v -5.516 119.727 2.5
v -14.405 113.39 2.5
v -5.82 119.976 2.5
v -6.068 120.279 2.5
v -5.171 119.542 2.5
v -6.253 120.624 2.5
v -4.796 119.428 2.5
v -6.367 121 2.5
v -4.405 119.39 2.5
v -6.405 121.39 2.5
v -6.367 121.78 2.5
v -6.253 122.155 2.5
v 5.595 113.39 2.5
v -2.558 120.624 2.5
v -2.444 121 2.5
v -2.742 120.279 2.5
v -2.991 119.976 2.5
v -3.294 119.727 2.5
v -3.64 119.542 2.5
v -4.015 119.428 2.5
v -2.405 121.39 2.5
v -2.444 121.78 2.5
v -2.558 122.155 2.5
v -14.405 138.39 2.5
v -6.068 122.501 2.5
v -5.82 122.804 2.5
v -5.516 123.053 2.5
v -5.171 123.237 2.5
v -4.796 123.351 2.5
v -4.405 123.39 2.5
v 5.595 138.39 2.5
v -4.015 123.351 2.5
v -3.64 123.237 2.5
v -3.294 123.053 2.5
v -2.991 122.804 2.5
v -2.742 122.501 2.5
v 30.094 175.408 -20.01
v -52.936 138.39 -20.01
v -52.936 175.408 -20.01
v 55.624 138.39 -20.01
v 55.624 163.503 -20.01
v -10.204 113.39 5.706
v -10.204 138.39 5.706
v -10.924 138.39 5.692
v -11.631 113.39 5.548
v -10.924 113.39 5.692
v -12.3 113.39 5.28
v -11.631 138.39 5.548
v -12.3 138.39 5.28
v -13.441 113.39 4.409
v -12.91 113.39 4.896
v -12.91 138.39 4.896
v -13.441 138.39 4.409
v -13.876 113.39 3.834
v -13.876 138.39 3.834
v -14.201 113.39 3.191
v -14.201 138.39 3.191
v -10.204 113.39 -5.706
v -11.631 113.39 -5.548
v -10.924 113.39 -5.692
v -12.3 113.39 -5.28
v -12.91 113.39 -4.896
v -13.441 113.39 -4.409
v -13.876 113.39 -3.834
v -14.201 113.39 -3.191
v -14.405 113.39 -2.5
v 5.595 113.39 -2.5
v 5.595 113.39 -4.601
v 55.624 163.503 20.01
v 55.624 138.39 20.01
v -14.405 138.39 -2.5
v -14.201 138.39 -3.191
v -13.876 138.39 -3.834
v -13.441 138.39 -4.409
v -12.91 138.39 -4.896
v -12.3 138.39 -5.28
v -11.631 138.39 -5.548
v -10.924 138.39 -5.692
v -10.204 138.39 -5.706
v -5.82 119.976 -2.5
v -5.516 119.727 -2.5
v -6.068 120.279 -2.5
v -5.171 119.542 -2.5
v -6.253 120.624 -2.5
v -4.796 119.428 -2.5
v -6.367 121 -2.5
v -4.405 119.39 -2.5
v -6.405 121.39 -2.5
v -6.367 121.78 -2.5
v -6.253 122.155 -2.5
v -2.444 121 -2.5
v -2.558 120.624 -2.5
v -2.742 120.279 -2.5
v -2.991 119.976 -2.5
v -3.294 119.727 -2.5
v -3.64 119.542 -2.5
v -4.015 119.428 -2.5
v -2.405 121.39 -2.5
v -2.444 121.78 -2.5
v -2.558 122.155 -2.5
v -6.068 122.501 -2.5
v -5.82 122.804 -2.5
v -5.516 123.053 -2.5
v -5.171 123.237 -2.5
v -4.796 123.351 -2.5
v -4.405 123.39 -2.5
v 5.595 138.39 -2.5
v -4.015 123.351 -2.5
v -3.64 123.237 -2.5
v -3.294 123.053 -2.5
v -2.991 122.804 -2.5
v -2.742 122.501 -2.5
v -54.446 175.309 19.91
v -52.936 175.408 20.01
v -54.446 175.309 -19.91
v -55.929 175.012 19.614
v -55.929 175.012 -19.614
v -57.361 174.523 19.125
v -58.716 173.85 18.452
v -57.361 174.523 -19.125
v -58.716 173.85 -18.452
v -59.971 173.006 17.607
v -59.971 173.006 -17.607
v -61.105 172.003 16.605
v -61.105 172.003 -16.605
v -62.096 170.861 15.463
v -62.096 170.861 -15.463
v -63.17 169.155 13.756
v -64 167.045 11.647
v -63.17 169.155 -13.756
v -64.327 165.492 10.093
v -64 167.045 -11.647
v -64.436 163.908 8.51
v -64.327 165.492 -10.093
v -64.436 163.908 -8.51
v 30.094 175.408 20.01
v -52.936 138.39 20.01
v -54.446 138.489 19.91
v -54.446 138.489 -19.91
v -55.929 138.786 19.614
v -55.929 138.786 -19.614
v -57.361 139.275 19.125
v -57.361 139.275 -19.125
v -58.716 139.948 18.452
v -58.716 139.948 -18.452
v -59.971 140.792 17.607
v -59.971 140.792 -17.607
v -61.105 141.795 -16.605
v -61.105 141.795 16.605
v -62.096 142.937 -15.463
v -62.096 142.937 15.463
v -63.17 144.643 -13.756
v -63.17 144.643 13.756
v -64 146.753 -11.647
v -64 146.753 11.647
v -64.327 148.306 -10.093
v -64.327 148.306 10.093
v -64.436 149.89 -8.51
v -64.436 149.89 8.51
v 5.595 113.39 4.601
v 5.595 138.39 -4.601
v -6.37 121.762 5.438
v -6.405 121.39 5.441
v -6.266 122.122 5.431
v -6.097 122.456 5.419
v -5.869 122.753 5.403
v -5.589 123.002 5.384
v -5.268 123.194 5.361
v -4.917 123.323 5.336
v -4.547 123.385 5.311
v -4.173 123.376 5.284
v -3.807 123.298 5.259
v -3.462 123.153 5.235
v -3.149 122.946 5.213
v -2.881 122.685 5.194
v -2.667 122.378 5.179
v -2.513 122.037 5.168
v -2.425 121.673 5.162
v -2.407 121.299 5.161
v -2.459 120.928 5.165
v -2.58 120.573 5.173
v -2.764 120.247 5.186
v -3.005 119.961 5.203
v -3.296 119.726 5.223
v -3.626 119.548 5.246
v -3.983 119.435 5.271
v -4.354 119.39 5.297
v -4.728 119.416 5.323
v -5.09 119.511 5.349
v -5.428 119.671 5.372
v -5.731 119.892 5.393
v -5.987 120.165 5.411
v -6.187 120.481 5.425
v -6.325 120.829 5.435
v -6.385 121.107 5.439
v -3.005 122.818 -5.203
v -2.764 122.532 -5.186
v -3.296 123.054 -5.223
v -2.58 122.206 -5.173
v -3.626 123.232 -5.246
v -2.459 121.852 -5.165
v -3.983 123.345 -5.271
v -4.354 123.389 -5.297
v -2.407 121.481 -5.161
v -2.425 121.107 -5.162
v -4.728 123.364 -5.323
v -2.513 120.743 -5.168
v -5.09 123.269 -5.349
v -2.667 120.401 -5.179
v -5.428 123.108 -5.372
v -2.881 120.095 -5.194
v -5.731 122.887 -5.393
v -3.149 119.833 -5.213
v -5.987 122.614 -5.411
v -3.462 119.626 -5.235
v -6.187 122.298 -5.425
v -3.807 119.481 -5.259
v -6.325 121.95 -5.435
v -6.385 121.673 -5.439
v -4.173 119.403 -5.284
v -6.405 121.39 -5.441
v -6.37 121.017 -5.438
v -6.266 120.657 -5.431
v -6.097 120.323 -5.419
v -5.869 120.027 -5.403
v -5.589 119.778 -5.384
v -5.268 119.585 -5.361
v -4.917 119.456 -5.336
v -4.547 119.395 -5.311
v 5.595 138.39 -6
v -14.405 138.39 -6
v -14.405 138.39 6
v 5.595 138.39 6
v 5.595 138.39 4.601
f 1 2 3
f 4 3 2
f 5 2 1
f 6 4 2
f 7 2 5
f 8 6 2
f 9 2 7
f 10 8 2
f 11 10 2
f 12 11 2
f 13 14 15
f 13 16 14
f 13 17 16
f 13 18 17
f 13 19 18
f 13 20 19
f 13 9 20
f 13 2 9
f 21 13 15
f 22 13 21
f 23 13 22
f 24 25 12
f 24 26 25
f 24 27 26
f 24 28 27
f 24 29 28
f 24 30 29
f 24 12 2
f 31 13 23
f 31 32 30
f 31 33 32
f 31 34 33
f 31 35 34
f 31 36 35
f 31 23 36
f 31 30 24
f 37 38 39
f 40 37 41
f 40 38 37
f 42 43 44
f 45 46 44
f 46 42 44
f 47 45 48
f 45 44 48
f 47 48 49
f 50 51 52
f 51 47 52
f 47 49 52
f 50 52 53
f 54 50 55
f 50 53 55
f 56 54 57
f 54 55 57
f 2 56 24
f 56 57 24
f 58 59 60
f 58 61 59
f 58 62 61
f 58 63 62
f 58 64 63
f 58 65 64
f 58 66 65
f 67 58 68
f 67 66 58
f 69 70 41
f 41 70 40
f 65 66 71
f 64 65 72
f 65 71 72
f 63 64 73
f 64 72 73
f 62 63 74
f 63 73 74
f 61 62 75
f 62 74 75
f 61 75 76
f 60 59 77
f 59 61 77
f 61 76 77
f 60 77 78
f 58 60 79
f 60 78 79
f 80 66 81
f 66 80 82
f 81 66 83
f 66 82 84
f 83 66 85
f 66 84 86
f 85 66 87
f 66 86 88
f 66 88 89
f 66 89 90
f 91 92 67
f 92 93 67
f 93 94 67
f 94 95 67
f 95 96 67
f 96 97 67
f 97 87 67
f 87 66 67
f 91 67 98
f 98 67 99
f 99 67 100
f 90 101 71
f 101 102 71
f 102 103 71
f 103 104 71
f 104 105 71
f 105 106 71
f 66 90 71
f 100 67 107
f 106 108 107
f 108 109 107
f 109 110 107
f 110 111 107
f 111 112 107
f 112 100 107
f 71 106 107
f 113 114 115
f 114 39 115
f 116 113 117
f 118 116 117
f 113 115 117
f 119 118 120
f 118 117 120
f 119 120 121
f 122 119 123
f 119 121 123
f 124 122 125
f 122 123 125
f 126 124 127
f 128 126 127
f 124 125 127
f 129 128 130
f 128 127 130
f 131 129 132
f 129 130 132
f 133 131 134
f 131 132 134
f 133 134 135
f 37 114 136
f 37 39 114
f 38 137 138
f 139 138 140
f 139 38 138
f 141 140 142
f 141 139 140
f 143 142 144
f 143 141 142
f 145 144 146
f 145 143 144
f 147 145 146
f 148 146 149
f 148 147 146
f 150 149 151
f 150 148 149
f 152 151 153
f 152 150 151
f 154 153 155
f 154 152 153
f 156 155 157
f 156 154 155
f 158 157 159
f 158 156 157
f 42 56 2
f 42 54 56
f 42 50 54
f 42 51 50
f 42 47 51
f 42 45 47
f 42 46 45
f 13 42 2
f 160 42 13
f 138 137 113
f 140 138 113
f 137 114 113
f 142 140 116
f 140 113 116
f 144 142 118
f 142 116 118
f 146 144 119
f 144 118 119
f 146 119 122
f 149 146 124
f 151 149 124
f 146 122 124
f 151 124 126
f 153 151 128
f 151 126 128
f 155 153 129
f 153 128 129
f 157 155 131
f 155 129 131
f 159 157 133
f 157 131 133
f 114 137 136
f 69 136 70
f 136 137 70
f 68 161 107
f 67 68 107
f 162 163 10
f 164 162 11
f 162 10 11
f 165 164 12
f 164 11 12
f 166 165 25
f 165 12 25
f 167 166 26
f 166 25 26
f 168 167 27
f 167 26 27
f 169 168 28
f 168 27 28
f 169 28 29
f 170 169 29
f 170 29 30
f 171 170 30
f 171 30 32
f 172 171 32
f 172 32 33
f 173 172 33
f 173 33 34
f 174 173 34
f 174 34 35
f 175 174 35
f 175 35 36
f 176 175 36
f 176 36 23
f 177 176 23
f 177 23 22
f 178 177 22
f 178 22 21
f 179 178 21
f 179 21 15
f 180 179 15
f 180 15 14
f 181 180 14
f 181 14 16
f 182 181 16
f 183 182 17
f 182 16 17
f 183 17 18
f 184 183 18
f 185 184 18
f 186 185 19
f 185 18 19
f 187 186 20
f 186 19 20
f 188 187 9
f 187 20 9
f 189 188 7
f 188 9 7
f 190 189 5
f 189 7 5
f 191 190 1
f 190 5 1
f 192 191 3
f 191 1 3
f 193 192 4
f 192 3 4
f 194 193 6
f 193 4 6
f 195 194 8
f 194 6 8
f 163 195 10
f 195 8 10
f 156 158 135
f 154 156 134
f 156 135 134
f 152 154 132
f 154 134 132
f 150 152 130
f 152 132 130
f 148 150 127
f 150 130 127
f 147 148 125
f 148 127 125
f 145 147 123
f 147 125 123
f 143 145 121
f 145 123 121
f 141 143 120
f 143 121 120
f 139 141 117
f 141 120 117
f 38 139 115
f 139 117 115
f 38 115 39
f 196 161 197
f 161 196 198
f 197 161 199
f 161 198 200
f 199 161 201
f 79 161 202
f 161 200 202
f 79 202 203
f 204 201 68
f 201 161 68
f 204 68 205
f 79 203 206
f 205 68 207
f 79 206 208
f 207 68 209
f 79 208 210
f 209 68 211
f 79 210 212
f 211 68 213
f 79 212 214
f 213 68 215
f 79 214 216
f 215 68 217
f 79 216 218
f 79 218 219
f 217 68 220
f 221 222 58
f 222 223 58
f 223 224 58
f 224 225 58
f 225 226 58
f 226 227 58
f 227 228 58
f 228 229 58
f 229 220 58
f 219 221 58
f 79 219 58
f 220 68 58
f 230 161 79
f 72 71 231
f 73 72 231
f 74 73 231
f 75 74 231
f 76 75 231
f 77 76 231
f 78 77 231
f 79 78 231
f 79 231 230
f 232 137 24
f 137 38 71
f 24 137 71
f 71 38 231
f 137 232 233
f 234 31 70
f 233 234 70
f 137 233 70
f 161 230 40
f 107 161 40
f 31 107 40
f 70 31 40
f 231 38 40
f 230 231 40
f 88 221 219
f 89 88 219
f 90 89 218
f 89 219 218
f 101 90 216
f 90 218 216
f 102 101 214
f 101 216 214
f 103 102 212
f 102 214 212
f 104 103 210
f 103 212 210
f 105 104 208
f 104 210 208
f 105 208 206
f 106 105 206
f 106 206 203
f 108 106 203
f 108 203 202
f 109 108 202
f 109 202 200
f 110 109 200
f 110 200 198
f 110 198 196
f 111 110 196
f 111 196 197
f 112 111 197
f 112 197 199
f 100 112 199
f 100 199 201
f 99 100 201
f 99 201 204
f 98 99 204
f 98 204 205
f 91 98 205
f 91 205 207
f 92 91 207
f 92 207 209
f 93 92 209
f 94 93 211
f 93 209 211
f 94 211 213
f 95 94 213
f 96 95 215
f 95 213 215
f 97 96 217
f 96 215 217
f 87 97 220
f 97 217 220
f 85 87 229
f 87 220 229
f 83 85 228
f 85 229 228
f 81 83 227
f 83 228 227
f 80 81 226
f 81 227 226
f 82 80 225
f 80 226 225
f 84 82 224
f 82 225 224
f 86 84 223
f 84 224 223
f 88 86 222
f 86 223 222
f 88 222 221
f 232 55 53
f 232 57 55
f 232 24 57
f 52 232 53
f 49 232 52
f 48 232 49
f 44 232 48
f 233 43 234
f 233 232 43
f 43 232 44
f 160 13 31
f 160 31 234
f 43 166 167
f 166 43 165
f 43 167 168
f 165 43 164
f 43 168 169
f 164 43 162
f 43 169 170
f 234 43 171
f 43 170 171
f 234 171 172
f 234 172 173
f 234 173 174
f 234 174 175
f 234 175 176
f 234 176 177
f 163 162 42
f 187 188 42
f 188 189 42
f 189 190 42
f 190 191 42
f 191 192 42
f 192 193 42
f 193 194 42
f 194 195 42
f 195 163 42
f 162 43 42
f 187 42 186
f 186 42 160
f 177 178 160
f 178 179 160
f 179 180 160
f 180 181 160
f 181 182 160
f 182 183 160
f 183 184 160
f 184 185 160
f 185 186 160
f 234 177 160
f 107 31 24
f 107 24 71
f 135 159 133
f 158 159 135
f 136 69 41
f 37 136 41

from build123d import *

# Parameters (mm, degrees)
SKETCH1_W            = 1044
SKETCH1_H            = 348
BOSS_EXTRUDE1_DEPTH  = 321.9
CHAMFER2_SIZE        = 222
CHAMFER2_SIZE2       = 103.52030011
FILLET1_R            = 100
SCALE1_SCALE         = 0.115
SKETCH175_W          = 20
SKETCH175_H          = 12
BOSS_EXTRUDE12_DEPTH = 25
SKETCH176_W          = 5
SKETCH176_H          = 25
CUT_EXTRUDE1_DEPTH   = 30
SKETCH177_R          = 2
CUT_EXTRUDE2_DEPTH   = 30
CUT_EXTRUDE4_DEPTH   = 25
FILLET3_R            = 4


with BuildPart() as part:
    # Sketch1 → Boss-Extrude1 (new body)
    with BuildSketch(Plane(origin=(0, 0, 0), x_dir=(1, 0, 0), z_dir=(0, 1, 0))):
        Rectangle(SKETCH1_W, SKETCH1_H)
    extrude(amount=BOSS_EXTRUDE1_DEPTH)

    # Chamfer2
    chamfer2_edges = [part.edges().sort_by_distance(p)[0] for p in [
        (522, 321.9, 0),
    ]]
    chamfer2_side = [part.faces().sort_by_distance(p)[0] for p in [
        (0, 321.9, 0),
    ]]
    chamfer(chamfer2_edges, length=CHAMFER2_SIZE, length2=CHAMFER2_SIZE2, reference=chamfer2_side[0])

    # Fillet1
    fillet1_edges = [part.edges().sort_by_distance(p)[0] for p in [
        (-522, 321.9, 0),
        (-522, 0, 0),
        (-522, 160.95, -174),
        (-522, 160.95, 174),
    ]]
    fillet(fillet1_edges, radius=FILLET1_R)


with BuildPart() as part_1:
    # Scale1: scaled about (-4.978902211, 156.372589253, 0)
    add(part.part.scale(SCALE1_SCALE).moved(Location((-4.406328457, 138.389741489, 0))))


with BuildPart() as boss_extrude12_tool:
    # Sketch175 → Boss-Extrude12 (new body)
    with BuildSketch(Plane.XZ.offset(-138.389734505)):
        with Locations((-4.405349795, 0)):
            Rectangle(SKETCH175_W, SKETCH175_H)
    extrude(amount=BOSS_EXTRUDE12_DEPTH)


with BuildPart() as part_2:
    add(part_1.part)


with BuildPart() as part_3:
    # Boss-Extrude12: joined with boss_extrude12_tool
    add(part_2.part.fuse(boss_extrude12_tool.part, tol=0.00001))

    # Sketch176 → Cut-Extrude1 (cut)
    with BuildSketch(Plane(origin=(5.594650205, 0, 0), x_dir=(0, 0, -1), z_dir=(1, 0, 0))):
        with Locations((0, 125.889734505)):
            Rectangle(SKETCH176_W, SKETCH176_H)
    extrude(amount=-CUT_EXTRUDE1_DEPTH, mode=Mode.SUBTRACT)

    # Sketch177 → Cut-Extrude2 (cut)
    with BuildSketch(Plane(origin=(0, 0, -6), x_dir=(-1, 0, 0), z_dir=(0, 0, -1))):
        with Locations((4.405349795, 121.389734505)):
            Circle(SKETCH177_R)
    extrude(amount=-CUT_EXTRUDE2_DEPTH, mode=Mode.SUBTRACT)

    # Sketch179 → Cut-Extrude4 (cut)
    with BuildSketch(Plane.XZ.offset(-113.389734505)):
        Polygon((-14.405349795, 6), (20.594650205, 3.552561582), (20.594650205, -3.552561582), (-14.405349795, -6), (23.594650205, -6), (23.594650205, 6), align=None)
    extrude(amount=-CUT_EXTRUDE4_DEPTH, mode=Mode.SUBTRACT)

    # Fillet3
    # the kernel refuses this fillet: 4 mm, written as the material it takes off along each edge
    with BuildSketch(Plane(origin=(-14.405349795, 138.389734505, -6), x_dir=(0, 0, 1), z_dir=(0, -1, 0))) as fillet3_piece_1:
        with BuildLine():
            CenterArc((4.284048925, -3.922405803), FILLET3_R, 101.30386139, 82.69613861)
            Line((0.293792724, -4.201431698), (0.2139876, -4.207012216))
            Line((0.2139876, -4.207012216), (-0.079805124, -0.005580518))
            Line((-0.079805124, -0.005580518), (0, 0.08))
            ThreePointArc((0, 0.08), (1.75, 0.08), (3.484319021, 0.078448116))
            Line((3.484319021, 0.078448116), (3.5, 0))
        make_face()
    extrude(amount=35.529227915, mode=Mode.SUBTRACT)
    with BuildSketch(Plane(origin=(-14.405349795, 138.389734505, 6), x_dir=(0, 0, -1), z_dir=(0, -1, 0))) as fillet3_piece_2:
        with BuildLine():
            CenterArc((4.284048925, 3.922405803), FILLET3_R, 176, 82.69613861)
            Line((0.293792724, 4.201431698), (0.2139876, 4.207012216))
            Line((0.2139876, 4.207012216), (-0.079805124, 0.005580518))
            Line((-0.079805124, 0.005580518), (0, -0.08))
            ThreePointArc((0, -0.08), (1.75, -0.08), (3.484319021, -0.078448116))
            Line((3.484319021, -0.078448116), (3.5, 0))
        make_face()
    extrude(amount=35.529227915, mode=Mode.SUBTRACT)


solid = part_3.part
